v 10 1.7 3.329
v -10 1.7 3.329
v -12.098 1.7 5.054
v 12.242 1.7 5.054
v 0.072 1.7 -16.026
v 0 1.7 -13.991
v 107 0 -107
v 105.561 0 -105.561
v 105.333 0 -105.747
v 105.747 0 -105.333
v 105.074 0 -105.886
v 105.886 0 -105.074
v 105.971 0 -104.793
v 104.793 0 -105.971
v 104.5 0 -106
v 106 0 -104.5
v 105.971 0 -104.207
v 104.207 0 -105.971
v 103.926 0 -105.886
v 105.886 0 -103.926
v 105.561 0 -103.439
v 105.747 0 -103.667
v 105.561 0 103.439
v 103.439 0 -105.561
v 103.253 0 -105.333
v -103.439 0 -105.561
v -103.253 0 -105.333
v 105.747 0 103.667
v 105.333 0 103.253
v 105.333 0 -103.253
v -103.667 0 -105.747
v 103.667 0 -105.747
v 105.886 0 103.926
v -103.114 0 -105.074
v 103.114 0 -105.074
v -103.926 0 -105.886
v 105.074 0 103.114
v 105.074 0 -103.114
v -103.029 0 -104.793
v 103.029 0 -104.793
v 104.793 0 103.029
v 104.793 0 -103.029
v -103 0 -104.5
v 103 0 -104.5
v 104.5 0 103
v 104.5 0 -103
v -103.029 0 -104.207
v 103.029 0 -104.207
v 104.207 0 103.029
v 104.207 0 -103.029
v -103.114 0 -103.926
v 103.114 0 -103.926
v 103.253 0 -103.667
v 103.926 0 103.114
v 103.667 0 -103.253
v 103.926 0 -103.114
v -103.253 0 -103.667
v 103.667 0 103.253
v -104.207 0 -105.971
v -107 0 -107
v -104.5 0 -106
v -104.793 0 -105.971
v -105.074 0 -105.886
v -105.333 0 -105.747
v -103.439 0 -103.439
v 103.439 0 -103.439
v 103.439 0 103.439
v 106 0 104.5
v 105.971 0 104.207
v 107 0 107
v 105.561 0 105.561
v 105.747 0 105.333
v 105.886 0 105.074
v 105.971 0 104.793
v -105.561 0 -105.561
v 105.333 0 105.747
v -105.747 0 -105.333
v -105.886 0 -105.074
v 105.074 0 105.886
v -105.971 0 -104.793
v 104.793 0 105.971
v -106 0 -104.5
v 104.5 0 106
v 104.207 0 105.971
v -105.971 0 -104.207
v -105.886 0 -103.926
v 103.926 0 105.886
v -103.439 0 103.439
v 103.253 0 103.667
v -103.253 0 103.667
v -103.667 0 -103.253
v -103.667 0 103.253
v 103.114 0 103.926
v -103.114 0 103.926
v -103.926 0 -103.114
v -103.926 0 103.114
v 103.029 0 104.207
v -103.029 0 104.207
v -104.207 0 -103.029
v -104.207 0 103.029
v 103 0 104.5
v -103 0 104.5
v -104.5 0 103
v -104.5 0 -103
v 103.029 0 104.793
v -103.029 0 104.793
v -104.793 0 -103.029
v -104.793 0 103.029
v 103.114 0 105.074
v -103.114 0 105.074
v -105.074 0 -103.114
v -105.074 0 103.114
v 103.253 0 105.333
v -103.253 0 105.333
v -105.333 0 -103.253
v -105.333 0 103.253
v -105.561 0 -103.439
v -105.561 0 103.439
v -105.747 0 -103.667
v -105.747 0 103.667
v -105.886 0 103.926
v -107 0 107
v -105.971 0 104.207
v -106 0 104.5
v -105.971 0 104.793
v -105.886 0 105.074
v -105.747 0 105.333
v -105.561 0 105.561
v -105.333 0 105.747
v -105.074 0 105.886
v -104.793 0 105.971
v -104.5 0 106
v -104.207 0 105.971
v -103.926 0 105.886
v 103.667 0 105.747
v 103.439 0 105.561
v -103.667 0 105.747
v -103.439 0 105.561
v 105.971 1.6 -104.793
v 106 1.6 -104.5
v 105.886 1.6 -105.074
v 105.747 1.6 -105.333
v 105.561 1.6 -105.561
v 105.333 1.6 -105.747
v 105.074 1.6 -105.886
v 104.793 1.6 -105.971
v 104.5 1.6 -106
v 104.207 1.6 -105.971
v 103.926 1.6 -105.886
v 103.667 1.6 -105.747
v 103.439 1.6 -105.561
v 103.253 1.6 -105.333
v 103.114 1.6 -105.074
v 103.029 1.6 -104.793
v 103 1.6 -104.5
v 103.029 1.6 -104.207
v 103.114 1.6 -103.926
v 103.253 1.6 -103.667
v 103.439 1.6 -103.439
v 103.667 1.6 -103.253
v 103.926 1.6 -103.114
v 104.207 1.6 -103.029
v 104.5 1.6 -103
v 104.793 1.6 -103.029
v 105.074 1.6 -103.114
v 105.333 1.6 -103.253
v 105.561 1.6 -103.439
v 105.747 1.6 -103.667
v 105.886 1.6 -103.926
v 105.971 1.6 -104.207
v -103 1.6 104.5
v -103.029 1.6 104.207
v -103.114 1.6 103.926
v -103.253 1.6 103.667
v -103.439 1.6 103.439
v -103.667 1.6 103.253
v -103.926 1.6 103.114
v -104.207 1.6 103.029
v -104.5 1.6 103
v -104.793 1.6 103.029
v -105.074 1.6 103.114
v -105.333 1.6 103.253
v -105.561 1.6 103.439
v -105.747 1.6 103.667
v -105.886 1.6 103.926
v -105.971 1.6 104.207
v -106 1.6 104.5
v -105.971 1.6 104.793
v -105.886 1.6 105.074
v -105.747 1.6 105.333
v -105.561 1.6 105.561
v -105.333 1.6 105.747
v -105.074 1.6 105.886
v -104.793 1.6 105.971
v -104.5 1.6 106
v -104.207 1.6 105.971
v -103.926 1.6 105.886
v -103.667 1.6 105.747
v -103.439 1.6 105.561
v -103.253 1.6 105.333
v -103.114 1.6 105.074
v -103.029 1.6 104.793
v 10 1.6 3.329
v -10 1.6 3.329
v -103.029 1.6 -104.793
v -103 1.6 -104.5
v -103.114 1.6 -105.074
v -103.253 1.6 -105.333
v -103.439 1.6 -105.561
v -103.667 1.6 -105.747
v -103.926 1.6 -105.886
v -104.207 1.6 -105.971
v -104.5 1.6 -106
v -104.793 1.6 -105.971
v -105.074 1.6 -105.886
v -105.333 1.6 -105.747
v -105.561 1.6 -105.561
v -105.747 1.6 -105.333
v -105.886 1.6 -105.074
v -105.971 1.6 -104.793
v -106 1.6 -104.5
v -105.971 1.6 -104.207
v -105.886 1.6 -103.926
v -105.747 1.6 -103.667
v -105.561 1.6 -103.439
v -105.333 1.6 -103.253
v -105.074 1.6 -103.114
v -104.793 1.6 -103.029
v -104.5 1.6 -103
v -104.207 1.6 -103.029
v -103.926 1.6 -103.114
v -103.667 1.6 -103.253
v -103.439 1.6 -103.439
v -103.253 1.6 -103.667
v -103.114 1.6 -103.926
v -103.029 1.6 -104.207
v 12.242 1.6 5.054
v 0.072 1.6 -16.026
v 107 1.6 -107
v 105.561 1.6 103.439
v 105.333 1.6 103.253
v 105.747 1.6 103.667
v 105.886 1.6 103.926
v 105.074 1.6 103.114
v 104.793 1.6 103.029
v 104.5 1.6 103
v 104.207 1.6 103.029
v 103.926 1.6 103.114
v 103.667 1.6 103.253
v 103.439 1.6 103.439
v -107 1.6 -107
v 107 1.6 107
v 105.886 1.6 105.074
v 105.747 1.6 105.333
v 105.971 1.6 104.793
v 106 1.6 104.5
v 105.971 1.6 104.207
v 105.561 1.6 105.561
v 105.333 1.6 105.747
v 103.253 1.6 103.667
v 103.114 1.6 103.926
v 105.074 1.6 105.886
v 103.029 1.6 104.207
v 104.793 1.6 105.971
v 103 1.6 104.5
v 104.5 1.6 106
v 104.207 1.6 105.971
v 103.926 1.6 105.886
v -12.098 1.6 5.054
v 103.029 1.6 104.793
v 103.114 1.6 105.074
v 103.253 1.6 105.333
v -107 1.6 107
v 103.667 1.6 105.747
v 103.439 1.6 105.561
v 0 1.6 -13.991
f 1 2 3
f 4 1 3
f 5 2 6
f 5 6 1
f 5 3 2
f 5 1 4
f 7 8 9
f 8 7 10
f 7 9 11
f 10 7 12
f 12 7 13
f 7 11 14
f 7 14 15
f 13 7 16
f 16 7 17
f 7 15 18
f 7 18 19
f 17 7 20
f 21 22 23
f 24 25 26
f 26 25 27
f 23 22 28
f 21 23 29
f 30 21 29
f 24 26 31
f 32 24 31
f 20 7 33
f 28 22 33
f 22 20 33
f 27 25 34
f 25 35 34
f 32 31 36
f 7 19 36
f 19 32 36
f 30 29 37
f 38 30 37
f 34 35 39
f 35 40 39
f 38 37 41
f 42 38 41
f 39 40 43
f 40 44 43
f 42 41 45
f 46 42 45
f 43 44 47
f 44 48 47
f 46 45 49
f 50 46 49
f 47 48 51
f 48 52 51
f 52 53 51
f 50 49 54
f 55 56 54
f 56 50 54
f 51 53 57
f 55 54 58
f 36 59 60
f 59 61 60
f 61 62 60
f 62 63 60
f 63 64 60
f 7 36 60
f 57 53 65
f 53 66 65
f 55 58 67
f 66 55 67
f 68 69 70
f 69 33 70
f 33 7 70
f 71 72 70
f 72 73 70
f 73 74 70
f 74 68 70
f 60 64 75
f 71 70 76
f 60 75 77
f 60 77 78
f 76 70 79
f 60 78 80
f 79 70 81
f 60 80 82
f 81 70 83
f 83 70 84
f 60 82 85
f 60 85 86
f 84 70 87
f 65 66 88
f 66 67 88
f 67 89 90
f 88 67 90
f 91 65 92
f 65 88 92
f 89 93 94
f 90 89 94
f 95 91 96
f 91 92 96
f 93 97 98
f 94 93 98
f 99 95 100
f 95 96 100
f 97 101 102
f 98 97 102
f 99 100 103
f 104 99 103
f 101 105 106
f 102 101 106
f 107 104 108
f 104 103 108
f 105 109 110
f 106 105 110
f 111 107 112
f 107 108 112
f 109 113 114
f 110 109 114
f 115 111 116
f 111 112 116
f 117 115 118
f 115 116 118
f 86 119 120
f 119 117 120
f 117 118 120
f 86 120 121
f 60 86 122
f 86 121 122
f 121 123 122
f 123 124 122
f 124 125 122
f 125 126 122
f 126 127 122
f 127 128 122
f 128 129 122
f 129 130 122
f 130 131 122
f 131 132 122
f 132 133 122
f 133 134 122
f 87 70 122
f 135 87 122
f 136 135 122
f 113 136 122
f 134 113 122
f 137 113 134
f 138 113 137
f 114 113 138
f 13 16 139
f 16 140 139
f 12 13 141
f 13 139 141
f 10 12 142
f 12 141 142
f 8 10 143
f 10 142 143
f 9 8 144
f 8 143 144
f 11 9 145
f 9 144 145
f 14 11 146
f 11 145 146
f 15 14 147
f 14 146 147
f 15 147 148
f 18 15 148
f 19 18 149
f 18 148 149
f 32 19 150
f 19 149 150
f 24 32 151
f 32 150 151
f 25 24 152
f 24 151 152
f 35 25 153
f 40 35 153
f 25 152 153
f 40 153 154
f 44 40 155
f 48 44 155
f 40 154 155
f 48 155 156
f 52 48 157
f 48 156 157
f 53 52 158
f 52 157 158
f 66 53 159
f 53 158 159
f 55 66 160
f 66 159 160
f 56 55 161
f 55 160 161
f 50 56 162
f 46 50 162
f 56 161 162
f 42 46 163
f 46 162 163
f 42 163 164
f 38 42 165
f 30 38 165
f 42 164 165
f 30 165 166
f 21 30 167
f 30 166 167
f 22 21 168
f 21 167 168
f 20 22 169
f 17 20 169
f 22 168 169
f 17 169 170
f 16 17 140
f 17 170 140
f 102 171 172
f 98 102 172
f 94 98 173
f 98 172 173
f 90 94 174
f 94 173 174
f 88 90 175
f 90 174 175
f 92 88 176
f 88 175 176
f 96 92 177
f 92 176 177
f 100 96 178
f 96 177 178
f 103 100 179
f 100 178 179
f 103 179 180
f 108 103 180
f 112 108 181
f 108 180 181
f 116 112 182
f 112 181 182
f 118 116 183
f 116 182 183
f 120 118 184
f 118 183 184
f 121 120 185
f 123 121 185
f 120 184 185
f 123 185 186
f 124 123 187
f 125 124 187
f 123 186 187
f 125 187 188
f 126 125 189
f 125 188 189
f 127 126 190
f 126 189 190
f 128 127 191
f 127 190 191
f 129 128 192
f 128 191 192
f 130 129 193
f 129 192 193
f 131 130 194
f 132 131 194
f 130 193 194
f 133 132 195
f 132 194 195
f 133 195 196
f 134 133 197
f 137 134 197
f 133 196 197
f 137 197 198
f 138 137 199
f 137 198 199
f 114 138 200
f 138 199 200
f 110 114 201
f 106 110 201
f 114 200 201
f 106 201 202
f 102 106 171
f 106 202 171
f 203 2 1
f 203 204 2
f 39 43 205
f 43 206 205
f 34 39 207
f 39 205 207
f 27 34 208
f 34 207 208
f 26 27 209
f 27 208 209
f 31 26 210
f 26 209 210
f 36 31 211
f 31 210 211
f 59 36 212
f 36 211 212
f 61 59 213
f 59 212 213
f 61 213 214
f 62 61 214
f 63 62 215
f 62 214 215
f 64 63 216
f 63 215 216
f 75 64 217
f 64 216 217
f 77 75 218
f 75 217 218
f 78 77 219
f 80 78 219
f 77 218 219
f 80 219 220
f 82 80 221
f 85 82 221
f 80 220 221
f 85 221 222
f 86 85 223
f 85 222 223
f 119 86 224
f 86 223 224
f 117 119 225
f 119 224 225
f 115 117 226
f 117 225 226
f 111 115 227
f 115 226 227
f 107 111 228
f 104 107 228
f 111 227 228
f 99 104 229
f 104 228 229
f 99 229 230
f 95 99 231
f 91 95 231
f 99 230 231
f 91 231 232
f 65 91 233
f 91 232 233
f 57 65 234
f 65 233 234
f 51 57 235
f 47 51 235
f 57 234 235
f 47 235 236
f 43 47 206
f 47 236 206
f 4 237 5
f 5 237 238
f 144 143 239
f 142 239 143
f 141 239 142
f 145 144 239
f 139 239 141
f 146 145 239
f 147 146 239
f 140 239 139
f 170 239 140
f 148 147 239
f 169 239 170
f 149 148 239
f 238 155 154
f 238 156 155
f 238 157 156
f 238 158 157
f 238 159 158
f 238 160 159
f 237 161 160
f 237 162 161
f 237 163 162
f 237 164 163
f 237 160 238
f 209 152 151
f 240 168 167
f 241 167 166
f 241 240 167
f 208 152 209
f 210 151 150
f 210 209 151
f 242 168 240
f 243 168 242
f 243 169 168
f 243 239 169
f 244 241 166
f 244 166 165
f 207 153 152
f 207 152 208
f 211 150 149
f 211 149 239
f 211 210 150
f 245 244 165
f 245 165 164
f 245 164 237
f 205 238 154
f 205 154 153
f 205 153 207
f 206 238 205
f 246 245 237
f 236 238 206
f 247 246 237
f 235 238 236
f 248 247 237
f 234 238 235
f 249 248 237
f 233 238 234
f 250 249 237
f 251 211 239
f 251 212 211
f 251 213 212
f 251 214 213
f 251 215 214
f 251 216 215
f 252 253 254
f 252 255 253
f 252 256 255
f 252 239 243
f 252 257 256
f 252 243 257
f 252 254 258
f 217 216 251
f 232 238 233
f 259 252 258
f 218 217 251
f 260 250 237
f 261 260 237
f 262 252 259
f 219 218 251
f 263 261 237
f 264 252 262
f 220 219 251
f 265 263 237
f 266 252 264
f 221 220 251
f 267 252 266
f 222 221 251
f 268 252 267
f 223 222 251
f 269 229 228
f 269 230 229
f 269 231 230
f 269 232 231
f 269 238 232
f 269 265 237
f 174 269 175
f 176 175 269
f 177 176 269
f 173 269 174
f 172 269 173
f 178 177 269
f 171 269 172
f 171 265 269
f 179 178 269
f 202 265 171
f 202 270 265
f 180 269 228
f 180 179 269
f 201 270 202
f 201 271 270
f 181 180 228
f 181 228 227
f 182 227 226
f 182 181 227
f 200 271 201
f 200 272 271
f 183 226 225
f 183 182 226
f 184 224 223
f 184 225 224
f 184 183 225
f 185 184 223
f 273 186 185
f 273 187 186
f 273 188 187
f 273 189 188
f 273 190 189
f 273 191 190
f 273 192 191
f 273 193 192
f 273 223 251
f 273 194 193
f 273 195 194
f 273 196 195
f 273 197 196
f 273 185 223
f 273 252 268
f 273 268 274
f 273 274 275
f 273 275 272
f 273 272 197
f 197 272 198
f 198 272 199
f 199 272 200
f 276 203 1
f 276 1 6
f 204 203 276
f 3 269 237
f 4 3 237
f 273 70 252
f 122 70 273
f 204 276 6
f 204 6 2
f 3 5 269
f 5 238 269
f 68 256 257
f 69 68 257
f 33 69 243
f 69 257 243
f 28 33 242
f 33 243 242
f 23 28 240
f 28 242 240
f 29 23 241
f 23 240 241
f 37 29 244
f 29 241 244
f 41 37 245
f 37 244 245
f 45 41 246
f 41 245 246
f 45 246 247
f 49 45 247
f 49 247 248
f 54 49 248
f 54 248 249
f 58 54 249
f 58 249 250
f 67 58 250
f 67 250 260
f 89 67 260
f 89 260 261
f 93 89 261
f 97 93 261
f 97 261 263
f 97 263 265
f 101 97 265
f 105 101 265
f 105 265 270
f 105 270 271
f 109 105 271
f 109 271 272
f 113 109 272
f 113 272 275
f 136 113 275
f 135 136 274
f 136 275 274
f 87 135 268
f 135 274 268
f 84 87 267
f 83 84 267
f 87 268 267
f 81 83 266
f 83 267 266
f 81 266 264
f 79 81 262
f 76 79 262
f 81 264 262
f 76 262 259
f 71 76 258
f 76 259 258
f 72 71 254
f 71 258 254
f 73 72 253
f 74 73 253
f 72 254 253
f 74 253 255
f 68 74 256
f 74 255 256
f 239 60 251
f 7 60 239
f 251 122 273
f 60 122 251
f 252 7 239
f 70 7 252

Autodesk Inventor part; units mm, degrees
ref_plane "YZ Plane" through (0, 0, 0) normal (1, 0, 0) x (0, 1, 0)
ref_plane "XZ Plane" through (0, 0, 0) normal (0, 1, 0) x (-1, 0, 0)
ref_plane "XY Plane" through (0, 0, 0) normal (0, 0, 1) x (1, 0, 0)
sketch "Sketch1" plane through (0, 0, 0) normal (0, 1, 0) x (-1, 0, 0)
  line L0 (-107, 107) -> (107, 107)
  line L1 (107, 107) -> (107, -107)
  line L2 (107, -107) -> (-107, -107)
  line L3 (-107, -107) -> (-107, 107)
  line L4 (-107, 107) -> (107, -107) construction
  line L5 (107, 107) -> (-107, -107) construction
  point P0 (0, 0)
  dimension "d0" = 214
  dimension "d1" = 214
extrude "Extrusion1" add sketch "Sketch1" along normal blind 1.6
sketch "Sketch2" plane through (0, 1.6, 0) normal (0, 1, 0) x (1, 0, 0)
  line L0 (-107, 107) -> (-107, -107) projected
  line L1 (0, 13.9914) -> (-10, -3.3291)
  line L2 (0, 13.9914) -> (20, 13.9914) construction
  line L3 (-10, -3.3291) -> (10, -3.3291)
  line L4 (10, -3.3291) -> (0, 13.9914)
  line L5 (-5.4032, 2.7326) -> (4.9323, 2.7326) construction
  line L6 (4.9323, 2.7326) -> (4.9323, -0.9149) construction
  line L7 (4.9323, -0.9149) -> (-5.4032, -0.9149) construction
  line L8 (-5.4032, -0.9149) -> (-5.4032, 2.7326) construction
  line L9 (0.0715, 16.0255) -> (-12.0985, -5.0535)
  line L10 (-12.0985, -5.0535) -> (12.2415, -5.0535)
  line L11 (12.2415, -5.0535) -> (0.0715, 16.0255)
  point P0 (0, 0)
  dimension "d4" = 20
  dimension "d6" = 20
  dimension "d9" = 24.34
  dimension "d10" = 24.34
extrude "Extrusion2" add sketch "Sketch2" along normal blind 0.1
sketch "Sketch3" plane through (0, 1.6, 0) normal (0, 1, 0) x (1, 0, 0)
  line L0 (104.5, -104.5) -> (-104.5, 104.5) construction
  circle A0 centre (-104.5, 104.5) radius 1.5
  circle A1 centre (104.5, 104.5) radius 1.5
  circle A2 centre (104.5, -104.5) radius 1.5
  circle A3 centre (-104.5, -104.5) radius 1.5
  point P0 (0, 0)
  dimension "d15" = 3
  dimension "d16" = 3
  dimension "d17" = 3
  dimension "d18" = 3
extrude "Extrusion3" cut sketch "Sketch3" against normal blind 10
properties part number "Heatbed" material "Aluminum, Anodized Red"
